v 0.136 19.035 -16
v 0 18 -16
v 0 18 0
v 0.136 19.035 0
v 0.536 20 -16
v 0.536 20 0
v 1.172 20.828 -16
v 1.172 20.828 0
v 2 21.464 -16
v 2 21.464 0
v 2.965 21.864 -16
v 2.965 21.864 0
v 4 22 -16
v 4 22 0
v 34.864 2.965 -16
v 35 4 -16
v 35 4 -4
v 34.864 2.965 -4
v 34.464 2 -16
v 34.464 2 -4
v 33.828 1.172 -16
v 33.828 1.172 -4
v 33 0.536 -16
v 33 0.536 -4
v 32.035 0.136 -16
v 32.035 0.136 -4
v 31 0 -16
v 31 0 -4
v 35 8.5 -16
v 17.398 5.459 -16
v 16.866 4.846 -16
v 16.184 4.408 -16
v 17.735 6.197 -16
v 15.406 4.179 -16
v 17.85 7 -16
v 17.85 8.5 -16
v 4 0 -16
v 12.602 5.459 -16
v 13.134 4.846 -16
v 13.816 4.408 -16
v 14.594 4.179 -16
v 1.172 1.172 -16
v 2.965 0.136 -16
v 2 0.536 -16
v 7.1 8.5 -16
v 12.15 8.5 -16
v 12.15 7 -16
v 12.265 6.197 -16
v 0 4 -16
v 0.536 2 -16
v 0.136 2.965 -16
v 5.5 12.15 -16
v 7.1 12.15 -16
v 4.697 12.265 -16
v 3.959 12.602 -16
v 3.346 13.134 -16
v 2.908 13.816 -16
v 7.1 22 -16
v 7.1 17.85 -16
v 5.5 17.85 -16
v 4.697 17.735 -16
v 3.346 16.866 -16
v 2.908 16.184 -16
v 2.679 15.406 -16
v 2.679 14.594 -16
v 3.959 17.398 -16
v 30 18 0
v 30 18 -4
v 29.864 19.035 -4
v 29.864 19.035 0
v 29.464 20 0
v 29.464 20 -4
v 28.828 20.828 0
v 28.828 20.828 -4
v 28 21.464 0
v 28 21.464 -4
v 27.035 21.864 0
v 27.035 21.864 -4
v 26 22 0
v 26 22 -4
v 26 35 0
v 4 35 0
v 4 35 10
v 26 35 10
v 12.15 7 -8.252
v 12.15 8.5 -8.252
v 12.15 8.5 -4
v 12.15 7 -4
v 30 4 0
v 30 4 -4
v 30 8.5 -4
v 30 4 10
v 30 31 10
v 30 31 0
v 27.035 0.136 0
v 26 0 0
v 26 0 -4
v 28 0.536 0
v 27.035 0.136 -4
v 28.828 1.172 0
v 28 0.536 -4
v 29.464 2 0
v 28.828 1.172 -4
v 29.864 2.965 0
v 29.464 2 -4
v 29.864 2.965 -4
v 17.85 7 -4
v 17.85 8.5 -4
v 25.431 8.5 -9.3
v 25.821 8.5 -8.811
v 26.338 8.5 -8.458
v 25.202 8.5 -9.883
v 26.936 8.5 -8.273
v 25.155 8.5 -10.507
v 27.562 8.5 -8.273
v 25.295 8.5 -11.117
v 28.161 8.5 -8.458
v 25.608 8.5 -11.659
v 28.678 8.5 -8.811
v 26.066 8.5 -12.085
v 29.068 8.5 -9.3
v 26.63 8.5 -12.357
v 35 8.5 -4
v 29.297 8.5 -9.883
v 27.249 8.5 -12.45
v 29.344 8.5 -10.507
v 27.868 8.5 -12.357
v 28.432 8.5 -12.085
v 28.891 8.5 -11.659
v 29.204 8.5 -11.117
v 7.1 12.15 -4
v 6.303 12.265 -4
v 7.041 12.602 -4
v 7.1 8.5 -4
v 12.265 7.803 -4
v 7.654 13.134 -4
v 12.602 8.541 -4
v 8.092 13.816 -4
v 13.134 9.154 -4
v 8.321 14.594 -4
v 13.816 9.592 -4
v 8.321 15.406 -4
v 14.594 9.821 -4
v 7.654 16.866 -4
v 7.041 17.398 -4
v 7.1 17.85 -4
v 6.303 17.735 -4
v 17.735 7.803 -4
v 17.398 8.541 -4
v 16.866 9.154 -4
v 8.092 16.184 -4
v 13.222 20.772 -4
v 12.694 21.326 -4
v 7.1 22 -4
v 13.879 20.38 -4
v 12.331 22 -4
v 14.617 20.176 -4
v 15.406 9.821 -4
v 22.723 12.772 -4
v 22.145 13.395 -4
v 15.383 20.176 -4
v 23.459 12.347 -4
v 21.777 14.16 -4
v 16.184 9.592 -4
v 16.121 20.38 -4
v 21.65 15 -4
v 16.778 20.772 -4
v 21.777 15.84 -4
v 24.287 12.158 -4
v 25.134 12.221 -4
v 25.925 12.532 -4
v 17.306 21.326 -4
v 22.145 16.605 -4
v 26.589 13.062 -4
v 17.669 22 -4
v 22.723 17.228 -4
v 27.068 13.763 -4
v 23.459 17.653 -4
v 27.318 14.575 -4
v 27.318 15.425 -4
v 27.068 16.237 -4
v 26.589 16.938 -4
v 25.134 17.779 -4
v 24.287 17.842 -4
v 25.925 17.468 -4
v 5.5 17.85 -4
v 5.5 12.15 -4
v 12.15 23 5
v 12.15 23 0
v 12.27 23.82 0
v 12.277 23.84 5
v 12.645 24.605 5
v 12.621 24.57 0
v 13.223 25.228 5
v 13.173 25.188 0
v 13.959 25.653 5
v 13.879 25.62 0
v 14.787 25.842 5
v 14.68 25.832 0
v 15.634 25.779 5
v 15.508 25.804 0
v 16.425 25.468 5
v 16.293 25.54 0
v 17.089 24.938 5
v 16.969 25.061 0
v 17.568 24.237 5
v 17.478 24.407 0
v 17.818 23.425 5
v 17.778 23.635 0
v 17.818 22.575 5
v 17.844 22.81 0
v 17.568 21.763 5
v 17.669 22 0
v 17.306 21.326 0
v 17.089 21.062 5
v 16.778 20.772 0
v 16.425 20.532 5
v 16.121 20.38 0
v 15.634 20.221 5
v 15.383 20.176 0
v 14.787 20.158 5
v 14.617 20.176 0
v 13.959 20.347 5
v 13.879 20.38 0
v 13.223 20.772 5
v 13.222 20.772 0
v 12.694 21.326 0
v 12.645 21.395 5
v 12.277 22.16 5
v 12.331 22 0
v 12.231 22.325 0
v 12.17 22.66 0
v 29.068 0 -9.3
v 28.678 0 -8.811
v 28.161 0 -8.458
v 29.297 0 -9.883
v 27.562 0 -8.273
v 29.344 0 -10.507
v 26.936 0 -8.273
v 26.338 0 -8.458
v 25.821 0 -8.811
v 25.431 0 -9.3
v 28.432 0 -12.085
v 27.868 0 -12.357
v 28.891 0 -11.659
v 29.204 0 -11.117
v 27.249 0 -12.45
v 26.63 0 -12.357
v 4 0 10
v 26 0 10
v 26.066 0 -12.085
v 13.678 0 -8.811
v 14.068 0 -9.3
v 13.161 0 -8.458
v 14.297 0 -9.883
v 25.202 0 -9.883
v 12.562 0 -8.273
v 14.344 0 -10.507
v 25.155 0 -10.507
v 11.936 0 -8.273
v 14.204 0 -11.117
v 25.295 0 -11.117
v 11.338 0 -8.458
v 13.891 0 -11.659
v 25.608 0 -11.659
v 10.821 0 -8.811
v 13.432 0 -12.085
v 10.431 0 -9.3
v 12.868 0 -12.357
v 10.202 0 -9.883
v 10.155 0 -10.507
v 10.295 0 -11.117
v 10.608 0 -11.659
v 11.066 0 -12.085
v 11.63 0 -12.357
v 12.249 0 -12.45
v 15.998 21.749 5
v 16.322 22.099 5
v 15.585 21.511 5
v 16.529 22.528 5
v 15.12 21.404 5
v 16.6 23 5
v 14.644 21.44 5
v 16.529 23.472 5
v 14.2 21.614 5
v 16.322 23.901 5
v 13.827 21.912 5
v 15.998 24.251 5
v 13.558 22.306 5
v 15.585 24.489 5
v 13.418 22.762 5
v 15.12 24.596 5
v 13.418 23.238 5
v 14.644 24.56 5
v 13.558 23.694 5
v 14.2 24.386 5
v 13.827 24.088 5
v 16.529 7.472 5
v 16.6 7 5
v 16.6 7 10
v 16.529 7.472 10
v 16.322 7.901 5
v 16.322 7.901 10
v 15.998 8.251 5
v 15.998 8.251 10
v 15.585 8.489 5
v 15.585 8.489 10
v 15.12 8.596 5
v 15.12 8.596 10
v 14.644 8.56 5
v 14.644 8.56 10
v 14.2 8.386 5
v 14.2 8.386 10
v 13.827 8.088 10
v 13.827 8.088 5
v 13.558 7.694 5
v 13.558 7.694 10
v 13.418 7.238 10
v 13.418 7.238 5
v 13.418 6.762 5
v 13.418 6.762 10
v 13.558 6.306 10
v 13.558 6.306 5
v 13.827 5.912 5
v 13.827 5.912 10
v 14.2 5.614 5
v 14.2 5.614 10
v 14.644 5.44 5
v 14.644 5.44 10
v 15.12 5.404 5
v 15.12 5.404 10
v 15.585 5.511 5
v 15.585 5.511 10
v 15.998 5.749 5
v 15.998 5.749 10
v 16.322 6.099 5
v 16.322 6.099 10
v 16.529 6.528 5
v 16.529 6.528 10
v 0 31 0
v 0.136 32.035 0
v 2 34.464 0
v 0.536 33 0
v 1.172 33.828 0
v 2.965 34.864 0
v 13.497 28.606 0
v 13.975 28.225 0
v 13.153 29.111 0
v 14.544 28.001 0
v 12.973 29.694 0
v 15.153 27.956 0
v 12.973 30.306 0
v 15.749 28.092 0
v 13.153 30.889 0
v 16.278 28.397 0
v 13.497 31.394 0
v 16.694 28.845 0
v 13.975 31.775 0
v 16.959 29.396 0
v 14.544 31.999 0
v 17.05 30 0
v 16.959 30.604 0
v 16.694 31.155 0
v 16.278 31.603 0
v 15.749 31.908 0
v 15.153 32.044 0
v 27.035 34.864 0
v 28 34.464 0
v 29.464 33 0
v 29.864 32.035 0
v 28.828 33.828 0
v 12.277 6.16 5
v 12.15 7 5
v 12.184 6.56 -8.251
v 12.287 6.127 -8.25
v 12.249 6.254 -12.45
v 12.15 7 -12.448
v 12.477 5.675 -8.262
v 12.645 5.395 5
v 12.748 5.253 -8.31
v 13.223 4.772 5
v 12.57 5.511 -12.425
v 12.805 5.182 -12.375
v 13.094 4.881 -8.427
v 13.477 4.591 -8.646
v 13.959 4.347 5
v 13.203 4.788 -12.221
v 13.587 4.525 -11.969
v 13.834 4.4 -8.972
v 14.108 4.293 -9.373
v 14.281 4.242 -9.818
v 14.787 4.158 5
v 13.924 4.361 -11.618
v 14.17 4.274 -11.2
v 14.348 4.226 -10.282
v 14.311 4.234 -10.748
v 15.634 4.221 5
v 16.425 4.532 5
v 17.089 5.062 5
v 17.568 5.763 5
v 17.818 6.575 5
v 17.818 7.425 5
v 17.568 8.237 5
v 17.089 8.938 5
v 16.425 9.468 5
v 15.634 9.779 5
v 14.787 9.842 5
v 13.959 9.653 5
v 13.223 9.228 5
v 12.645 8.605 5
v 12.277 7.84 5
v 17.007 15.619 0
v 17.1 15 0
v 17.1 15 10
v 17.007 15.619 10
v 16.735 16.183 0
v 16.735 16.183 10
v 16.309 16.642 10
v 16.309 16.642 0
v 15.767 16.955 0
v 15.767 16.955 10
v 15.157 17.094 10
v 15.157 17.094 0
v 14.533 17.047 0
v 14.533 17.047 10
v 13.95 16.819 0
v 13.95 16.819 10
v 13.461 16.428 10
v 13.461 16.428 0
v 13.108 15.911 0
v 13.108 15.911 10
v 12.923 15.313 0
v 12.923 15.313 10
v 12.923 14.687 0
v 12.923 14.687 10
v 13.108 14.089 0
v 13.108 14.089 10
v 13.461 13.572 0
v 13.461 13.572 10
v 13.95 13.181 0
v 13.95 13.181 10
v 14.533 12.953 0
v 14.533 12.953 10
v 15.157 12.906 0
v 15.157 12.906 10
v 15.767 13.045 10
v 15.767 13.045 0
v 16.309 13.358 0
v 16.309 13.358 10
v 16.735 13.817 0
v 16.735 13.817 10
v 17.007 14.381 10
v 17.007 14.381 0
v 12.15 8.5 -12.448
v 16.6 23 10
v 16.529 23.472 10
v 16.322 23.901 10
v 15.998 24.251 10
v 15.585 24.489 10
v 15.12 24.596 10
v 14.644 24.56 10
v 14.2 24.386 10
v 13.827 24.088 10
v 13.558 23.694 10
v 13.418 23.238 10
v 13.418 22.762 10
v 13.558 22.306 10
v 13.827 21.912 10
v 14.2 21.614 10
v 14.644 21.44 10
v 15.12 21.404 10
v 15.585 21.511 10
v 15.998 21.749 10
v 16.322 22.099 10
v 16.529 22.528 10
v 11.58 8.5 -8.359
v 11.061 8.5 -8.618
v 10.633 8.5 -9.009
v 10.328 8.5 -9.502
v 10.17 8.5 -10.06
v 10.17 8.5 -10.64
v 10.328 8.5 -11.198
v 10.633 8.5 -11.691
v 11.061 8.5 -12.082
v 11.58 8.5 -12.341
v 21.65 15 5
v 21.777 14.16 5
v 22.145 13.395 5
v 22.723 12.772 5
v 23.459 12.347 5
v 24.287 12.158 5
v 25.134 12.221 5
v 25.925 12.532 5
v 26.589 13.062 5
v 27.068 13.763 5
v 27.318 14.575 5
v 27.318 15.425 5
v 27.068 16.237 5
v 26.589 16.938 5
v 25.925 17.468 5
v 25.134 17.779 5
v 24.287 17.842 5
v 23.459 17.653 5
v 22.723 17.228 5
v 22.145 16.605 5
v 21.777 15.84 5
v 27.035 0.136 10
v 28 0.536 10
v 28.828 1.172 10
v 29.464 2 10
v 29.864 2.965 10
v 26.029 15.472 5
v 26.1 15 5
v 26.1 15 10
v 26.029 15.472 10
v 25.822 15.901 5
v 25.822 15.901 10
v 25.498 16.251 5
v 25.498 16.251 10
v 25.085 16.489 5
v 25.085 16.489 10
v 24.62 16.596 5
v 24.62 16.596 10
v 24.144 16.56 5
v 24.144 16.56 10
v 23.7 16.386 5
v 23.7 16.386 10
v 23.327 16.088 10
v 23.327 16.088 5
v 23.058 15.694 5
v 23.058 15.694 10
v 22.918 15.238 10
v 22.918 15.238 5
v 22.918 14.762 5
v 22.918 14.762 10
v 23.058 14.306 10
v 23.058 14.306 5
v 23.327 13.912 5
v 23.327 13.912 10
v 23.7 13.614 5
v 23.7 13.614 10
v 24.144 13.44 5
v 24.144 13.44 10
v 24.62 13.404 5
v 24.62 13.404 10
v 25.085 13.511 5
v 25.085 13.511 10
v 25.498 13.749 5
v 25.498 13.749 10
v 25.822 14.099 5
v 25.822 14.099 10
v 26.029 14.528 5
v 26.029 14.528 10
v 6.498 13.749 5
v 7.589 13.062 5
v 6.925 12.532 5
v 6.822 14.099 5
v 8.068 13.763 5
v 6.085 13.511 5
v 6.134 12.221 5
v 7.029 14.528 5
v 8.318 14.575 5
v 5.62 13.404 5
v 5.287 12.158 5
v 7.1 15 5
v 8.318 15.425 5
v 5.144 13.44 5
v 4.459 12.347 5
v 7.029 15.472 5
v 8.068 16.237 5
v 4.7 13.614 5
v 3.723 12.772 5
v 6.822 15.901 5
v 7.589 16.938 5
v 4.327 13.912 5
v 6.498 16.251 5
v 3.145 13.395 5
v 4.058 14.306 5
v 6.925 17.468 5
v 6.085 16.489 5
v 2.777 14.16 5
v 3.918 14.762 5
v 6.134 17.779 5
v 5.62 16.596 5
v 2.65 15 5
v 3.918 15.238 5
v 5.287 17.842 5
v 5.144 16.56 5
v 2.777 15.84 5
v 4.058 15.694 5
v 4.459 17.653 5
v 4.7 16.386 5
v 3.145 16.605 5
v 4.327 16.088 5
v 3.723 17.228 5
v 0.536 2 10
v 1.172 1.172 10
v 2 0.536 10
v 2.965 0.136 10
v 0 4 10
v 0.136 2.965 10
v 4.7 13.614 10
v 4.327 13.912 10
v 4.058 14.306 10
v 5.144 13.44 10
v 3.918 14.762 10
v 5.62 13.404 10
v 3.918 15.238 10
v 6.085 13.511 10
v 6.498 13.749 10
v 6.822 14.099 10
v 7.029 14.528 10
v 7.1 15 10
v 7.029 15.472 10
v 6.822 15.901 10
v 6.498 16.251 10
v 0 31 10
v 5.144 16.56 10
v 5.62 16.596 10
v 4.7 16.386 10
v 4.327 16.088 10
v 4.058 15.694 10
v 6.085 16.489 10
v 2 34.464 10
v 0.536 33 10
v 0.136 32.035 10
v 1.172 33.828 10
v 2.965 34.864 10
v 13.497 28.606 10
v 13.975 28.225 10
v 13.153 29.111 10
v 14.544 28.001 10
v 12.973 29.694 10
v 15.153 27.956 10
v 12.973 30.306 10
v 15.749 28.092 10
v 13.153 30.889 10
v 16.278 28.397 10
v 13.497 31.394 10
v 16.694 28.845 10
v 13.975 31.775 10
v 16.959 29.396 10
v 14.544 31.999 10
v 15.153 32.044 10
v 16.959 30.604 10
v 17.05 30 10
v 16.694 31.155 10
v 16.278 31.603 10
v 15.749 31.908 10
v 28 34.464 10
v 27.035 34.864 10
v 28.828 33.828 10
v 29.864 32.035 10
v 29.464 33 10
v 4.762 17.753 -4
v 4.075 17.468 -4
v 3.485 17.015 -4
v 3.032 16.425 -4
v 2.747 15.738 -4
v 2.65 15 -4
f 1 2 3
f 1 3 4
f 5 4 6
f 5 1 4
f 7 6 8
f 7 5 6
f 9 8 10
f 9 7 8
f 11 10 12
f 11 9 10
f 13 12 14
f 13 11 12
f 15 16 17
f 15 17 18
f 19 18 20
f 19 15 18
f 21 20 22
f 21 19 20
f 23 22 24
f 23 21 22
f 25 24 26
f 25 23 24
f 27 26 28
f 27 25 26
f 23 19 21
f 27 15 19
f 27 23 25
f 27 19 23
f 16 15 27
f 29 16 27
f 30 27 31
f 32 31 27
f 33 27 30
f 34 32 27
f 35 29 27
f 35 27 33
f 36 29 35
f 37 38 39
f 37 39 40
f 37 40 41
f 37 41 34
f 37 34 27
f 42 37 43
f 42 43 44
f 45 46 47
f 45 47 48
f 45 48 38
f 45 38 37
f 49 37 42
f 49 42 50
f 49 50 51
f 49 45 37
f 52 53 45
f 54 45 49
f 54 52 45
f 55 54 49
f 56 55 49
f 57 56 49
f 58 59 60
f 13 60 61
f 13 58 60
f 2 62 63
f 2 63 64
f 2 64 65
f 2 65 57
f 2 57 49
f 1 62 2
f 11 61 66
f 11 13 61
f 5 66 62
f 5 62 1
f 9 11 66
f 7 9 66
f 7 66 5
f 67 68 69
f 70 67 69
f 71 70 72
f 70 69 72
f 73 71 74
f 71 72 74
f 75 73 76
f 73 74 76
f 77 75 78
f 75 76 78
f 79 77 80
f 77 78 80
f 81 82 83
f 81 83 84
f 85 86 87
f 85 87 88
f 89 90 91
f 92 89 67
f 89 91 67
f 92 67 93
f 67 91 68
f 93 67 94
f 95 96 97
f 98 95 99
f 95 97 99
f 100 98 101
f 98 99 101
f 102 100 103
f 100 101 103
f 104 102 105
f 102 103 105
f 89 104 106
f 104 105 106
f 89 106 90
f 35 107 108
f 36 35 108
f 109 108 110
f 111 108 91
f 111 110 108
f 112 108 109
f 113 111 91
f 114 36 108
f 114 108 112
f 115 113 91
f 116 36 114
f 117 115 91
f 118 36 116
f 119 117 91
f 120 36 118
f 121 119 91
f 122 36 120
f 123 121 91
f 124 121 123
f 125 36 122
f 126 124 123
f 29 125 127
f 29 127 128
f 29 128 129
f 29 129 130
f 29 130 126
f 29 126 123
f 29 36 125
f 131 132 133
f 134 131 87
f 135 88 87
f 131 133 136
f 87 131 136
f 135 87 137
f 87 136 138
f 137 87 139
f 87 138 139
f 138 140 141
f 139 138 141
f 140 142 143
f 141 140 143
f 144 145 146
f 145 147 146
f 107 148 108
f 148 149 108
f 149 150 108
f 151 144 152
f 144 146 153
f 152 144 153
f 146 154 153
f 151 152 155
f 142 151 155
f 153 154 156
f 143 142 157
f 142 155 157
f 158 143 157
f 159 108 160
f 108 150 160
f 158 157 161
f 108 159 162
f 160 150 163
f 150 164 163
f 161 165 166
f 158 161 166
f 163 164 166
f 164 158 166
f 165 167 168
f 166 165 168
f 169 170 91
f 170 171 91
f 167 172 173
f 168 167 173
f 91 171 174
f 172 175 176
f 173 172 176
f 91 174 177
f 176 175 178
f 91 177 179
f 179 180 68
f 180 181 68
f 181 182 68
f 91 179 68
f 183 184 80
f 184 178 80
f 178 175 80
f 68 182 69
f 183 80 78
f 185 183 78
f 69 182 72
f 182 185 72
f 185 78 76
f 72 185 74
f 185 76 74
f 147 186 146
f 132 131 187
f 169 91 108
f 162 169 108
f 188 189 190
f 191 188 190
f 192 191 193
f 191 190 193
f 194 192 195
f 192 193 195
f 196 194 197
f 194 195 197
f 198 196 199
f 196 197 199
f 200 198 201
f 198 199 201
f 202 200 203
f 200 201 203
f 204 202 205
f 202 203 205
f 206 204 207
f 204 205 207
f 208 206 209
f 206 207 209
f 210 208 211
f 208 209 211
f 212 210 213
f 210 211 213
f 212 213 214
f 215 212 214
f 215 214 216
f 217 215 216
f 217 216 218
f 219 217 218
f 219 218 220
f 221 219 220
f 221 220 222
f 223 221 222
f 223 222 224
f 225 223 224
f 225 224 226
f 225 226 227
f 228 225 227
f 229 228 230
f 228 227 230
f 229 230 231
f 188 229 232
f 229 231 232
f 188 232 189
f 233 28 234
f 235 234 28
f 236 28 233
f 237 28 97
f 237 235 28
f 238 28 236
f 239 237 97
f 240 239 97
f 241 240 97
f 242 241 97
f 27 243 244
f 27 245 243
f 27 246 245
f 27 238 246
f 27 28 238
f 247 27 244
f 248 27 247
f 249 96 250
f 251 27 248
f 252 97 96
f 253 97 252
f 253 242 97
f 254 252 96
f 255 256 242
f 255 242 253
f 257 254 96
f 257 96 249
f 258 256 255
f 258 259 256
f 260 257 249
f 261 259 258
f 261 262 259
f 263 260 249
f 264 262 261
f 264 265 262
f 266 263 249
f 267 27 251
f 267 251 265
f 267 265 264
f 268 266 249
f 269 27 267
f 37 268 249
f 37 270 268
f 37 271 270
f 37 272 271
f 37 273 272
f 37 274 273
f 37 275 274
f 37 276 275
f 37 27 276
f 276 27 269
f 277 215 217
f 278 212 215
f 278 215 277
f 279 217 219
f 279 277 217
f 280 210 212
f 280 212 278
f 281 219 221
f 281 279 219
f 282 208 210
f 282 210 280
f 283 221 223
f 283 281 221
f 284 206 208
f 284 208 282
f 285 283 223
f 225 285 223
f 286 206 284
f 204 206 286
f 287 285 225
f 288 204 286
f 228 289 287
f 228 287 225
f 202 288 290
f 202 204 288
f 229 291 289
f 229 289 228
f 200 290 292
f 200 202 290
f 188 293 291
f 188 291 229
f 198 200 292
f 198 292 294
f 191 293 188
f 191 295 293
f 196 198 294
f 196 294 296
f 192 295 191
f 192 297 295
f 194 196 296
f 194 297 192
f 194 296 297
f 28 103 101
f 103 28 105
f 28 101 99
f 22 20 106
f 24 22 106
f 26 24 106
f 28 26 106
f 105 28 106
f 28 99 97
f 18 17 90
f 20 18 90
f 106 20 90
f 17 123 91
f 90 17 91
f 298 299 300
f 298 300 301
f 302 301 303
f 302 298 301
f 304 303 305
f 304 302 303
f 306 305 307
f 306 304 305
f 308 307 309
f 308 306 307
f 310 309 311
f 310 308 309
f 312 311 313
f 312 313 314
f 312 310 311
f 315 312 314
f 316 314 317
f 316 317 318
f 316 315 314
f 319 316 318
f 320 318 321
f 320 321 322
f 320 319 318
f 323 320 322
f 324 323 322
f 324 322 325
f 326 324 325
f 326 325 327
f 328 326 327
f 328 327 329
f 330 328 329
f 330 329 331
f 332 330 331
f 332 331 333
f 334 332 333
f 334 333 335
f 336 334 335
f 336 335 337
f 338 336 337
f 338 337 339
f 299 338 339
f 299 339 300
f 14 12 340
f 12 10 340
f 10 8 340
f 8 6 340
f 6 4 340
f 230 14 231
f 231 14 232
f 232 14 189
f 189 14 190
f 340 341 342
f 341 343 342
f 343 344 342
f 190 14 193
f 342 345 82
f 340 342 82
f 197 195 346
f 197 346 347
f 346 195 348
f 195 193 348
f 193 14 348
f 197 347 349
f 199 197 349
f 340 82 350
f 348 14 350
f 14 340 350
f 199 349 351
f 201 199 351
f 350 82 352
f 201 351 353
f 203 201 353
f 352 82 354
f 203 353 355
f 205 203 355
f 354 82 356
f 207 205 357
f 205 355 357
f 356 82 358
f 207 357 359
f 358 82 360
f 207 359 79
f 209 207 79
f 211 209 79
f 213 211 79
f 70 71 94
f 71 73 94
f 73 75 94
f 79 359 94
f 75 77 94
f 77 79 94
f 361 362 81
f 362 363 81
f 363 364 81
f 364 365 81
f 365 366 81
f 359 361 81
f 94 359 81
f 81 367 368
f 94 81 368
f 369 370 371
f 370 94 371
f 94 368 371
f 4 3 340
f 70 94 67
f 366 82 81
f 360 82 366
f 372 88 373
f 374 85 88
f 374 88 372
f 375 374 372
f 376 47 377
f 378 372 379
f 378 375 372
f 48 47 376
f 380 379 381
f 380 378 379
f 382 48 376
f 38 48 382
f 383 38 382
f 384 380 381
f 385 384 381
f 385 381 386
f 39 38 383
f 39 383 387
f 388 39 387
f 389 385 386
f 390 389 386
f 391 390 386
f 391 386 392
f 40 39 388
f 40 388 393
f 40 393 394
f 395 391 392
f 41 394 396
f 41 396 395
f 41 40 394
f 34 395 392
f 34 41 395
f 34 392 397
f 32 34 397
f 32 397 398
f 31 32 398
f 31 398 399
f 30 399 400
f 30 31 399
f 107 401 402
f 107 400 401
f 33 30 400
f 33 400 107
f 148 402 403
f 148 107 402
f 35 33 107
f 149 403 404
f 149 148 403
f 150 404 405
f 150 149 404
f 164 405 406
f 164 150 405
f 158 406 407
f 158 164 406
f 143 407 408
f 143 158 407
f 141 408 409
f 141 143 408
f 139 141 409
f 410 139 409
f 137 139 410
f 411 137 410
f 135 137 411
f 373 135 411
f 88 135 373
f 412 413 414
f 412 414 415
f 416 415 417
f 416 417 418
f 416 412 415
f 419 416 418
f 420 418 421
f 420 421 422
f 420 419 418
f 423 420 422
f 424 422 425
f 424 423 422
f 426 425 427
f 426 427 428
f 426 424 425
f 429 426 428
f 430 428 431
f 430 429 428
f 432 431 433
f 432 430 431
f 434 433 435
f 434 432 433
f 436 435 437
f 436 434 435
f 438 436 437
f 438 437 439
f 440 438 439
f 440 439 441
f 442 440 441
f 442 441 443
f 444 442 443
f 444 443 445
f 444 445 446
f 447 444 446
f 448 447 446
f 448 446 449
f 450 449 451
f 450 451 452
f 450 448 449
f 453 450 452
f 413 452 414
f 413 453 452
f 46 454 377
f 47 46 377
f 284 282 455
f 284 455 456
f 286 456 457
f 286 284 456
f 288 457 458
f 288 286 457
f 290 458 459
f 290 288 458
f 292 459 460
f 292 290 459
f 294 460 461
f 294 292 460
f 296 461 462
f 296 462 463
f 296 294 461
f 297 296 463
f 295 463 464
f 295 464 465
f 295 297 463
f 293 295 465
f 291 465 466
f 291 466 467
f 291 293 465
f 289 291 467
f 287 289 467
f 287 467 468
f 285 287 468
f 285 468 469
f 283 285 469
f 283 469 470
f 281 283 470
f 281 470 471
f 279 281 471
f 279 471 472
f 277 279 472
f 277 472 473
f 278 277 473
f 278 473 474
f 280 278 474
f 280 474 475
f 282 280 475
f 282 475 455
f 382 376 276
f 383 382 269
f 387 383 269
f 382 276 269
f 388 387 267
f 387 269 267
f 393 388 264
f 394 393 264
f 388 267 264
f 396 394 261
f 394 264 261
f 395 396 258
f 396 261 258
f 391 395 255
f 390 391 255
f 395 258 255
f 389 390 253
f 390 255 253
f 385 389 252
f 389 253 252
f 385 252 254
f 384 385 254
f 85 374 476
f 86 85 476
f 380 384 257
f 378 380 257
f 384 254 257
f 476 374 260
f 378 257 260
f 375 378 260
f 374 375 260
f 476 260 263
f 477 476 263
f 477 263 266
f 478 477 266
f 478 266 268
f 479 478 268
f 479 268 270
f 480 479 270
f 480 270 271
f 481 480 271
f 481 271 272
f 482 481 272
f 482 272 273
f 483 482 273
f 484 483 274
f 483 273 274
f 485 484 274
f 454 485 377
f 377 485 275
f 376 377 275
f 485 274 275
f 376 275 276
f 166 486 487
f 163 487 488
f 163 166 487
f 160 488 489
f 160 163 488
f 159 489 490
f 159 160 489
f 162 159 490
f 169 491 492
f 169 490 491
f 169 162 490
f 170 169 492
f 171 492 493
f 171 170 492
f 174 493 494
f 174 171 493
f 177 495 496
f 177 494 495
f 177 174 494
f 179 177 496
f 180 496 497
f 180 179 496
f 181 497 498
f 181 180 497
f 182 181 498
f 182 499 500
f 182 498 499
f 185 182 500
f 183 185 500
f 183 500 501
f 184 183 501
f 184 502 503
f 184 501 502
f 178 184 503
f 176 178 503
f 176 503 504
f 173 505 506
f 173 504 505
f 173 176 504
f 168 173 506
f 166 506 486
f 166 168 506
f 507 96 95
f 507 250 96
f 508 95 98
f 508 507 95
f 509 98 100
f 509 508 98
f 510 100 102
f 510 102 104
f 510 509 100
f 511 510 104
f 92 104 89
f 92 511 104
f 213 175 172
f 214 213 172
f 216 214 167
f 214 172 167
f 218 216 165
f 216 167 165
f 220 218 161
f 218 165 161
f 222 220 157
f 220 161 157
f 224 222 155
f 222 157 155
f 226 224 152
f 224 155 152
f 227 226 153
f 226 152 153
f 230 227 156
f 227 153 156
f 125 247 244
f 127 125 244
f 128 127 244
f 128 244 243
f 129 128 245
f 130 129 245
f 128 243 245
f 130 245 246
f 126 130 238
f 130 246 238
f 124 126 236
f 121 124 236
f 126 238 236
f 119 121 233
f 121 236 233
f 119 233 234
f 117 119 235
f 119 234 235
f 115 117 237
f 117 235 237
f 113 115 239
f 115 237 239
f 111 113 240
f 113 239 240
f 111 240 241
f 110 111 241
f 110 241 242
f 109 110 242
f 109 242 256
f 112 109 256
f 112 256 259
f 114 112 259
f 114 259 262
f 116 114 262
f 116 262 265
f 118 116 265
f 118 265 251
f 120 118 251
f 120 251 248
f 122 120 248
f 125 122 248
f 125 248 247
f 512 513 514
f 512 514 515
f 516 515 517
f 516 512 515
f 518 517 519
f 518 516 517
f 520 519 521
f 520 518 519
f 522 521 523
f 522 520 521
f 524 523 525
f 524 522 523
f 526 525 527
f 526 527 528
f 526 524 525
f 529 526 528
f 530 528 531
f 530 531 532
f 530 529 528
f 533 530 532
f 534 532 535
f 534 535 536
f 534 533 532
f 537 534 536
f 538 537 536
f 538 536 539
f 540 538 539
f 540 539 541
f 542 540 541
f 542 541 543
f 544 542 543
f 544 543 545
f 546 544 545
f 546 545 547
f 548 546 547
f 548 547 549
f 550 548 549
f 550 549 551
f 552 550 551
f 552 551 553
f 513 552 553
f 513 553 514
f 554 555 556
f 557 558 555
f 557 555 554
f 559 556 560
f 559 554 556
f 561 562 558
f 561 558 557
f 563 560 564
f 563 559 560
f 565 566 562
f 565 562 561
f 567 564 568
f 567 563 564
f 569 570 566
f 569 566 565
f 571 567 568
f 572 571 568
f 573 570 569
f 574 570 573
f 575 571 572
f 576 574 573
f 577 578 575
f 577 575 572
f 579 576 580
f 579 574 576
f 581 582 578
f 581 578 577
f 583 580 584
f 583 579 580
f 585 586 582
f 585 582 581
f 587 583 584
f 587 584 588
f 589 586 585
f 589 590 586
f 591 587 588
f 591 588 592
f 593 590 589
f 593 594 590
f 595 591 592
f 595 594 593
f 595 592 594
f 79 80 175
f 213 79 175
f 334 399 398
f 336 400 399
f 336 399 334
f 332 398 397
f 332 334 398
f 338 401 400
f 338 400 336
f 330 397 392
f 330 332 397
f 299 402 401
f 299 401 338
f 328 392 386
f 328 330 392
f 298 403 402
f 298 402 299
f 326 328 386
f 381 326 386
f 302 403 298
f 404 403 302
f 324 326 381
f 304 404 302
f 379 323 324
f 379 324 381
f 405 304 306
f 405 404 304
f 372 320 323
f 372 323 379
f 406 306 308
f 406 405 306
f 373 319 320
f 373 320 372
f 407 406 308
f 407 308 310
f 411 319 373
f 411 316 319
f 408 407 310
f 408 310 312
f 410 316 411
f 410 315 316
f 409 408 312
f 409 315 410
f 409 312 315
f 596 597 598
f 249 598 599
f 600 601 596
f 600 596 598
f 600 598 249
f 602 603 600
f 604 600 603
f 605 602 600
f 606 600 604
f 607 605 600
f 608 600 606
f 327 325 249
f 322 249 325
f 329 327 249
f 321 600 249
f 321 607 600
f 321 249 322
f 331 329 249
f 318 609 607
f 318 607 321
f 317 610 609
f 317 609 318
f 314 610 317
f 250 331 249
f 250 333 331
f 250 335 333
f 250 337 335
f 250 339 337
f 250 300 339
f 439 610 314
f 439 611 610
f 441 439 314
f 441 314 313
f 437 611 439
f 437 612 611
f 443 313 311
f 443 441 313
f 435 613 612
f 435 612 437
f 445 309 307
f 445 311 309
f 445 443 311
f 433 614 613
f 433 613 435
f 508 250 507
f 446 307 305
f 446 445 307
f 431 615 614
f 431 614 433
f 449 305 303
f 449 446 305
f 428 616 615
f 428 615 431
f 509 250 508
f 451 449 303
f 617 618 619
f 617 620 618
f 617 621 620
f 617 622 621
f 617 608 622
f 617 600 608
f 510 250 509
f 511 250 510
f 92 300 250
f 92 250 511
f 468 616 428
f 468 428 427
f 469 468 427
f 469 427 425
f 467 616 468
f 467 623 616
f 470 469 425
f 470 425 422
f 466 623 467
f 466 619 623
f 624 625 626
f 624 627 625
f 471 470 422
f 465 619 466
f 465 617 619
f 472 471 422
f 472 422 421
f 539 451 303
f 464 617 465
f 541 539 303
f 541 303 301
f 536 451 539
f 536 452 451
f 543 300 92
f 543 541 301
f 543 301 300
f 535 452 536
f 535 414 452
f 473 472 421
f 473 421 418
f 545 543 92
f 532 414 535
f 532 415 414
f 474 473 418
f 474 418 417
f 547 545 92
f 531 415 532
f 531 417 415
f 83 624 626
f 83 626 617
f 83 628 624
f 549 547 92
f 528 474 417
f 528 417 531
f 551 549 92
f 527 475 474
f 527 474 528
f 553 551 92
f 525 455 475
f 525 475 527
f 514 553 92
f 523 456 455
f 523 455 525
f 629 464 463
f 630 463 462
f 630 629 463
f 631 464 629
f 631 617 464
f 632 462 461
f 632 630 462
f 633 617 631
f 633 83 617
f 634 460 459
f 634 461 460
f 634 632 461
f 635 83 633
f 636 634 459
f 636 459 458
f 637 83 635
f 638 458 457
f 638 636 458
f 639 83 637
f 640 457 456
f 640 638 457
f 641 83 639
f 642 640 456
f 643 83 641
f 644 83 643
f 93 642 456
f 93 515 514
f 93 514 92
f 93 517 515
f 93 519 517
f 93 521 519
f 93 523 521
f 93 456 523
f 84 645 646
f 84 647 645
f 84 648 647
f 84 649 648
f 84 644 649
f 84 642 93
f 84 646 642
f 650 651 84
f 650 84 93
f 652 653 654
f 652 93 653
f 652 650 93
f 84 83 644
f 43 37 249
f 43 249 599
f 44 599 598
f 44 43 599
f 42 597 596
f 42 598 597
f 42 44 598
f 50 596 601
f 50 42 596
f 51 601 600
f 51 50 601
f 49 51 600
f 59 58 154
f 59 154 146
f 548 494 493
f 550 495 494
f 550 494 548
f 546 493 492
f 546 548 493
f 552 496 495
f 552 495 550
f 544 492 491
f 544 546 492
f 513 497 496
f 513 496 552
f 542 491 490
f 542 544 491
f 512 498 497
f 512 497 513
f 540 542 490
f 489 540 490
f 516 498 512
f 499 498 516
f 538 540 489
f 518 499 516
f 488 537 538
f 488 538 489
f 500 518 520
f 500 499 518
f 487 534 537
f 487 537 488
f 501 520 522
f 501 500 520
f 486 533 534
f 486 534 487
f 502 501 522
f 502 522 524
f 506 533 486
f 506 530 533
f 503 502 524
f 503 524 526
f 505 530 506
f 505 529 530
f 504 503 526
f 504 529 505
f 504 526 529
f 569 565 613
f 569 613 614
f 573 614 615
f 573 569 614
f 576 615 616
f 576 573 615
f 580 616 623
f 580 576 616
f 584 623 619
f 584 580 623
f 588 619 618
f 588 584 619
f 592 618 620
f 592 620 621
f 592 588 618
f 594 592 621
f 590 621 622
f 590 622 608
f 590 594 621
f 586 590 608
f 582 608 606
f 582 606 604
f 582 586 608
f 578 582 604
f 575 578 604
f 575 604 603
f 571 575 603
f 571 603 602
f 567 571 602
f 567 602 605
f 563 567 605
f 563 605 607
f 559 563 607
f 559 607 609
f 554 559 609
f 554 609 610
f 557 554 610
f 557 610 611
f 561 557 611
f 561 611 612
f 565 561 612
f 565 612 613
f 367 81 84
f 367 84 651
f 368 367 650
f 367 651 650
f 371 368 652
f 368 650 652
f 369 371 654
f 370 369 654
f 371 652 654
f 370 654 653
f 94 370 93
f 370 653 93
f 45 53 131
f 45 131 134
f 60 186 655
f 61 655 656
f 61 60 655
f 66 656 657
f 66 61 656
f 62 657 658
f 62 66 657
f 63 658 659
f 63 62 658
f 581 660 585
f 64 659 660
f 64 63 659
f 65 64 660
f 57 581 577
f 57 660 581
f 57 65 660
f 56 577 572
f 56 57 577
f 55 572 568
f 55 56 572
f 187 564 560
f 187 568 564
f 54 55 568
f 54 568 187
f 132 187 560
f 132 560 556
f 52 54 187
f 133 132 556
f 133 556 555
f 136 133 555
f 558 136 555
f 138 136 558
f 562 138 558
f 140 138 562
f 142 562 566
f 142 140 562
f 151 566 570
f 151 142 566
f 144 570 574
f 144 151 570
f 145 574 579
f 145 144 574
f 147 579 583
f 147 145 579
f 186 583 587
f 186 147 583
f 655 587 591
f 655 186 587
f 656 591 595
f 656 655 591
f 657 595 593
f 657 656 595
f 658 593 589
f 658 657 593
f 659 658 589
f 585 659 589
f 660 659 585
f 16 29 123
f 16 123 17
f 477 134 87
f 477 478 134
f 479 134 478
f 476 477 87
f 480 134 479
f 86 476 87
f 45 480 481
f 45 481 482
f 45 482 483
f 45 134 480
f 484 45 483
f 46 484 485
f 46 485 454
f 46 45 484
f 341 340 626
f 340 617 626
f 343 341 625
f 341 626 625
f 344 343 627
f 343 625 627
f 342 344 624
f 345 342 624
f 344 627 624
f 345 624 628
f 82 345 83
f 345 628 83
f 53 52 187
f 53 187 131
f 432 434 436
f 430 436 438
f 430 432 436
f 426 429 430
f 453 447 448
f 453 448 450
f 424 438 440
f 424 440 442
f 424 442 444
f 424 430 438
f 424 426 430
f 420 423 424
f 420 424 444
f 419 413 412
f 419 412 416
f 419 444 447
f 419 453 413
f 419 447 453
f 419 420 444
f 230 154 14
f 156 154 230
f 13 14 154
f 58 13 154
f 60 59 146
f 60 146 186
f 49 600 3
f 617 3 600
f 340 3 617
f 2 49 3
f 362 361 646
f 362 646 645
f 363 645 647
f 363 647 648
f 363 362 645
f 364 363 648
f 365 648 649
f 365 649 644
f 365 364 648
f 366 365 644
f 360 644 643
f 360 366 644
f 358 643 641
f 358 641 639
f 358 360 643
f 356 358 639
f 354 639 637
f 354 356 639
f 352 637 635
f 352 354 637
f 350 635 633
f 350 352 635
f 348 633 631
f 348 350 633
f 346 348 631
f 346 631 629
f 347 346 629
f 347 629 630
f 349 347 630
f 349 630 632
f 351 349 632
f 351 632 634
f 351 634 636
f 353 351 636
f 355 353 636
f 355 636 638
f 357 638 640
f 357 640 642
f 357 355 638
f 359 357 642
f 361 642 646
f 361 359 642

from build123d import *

# Parameters (mm, degrees)
SKETCH1_W           = 30
SKETCH1_H           = 35
SKETCH1_R           = 2.05
SKETCH1_R_2         = 2.1
SKETCH1_R_3         = 1.6
BOSS_EXTRUDE1_DEPTH = 10
SKETCH2_R           = 2.85
CUT_EXTRUDE1_DEPTH  = 5
FILLET1_R           = 4
BOSS_EXTRUDE2_START = -4
SKETCH6_R           = 2.85
BOSS_EXTRUDE2_DEPTH = 4
BOSS_EXTRUDE3_START = 12
BOSS_EXTRUDE3_DEPTH = 12
SKETCH8_R           = 2.1
CUT_EXTRUDE4_DEPTH  = 53.019227215


with BuildPart() as part:
    # Sketch1 → Boss-Extrude1 (new body)
    with BuildSketch(Plane.XY):
        with Locations((15, 17.5)):
            Rectangle(SKETCH1_W, SKETCH1_H)
        with Locations((15, 30)):
            Circle(SKETCH1_R, mode=Mode.SUBTRACT)
        with Locations((15, 15)):
            Circle(SKETCH1_R_2, mode=Mode.SUBTRACT)
        with Locations((5.5, 15)):
            Circle(SKETCH1_R_3, mode=Mode.SUBTRACT)
        with Locations((24.5, 15)):
            Circle(SKETCH1_R_3, mode=Mode.SUBTRACT)
        with Locations((15, 7)):
            Circle(SKETCH1_R_3, mode=Mode.SUBTRACT)
        with Locations((15, 23)):
            Circle(SKETCH1_R_3, mode=Mode.SUBTRACT)
    extrude(amount=BOSS_EXTRUDE1_DEPTH)

    # Sketch2 → Cut-Extrude1 (cut)
    with BuildSketch(Plane(origin=(0, 0, 0), x_dir=(-1, 0, 0), z_dir=(0, 0, -1))):
        with Locations((-15, 7)):
            Circle(SKETCH2_R)
        with Locations((-24.5, 15)):
            Circle(SKETCH2_R)
        with Locations((-15, 23)):
            Circle(SKETCH2_R)
        with Locations((-5.5, 15)):
            Circle(SKETCH2_R)
    extrude(amount=-CUT_EXTRUDE1_DEPTH, mode=Mode.SUBTRACT)

    # Fillet1
    fillet1_edges = [part.edges().sort_by_distance(p)[0] for p in [
        (0, 35, 5),
        (30, 35, 5),
        (30, 0, 5),
        (0, 0, 5),
    ]]
    fillet(fillet1_edges, radius=FILLET1_R)

    # Sketch6 → Boss-Extrude2 (add)
    with BuildSketch(Plane.XY.offset(BOSS_EXTRUDE2_START)):
        with BuildLine():
            Line((26, 22), (17.668801229, 22))
            ThreePointArc((17.668801229, 22), (15, 20.15), (12.331198771, 22))
            Line((12.331198771, 22), (4, 22))
            ThreePointArc((4, 22), (1.171572875, 20.828427125), (0, 18))
            Line((0, 18), (0, 4))
            ThreePointArc((0, 4), (1.171572875, 1.171572875), (4, 0))
            Line((4, 0), (26, 0))
            ThreePointArc((26, 0), (28.828427125, 1.171572875), (30, 4))
            Line((30, 4), (30, 18))
            ThreePointArc((30, 18), (28.828427125, 20.828427125), (26, 22))
        make_face()
        with Locations((5.5, 15)):
            Circle(SKETCH6_R, mode=Mode.SUBTRACT)
        with Locations((15, 7)):
            Circle(SKETCH6_R, mode=Mode.SUBTRACT)
        with Locations((24.5, 15)):
            Circle(SKETCH6_R, mode=Mode.SUBTRACT)
    extrude(amount=BOSS_EXTRUDE2_DEPTH)

    # Sketch7 → Boss-Extrude3 (add)
    with BuildSketch(Plane(origin=(0, 0, -4), x_dir=(-1, 0, 0), z_dir=(0, 0, -1)).offset(BOSS_EXTRUDE3_START)):
        with BuildLine():
            Line((-7.1, 22), (-7.1, 17.85))
            Line((-7.1, 17.85), (-5.5, 17.85))
            ThreePointArc((-5.5, 17.85), (-2.65, 15), (-5.5, 12.15))
            Line((-5.5, 12.15), (-7.1, 12.15))
            Line((-7.1, 12.15), (-7.1, 8.5))
            Line((-7.1, 8.5), (-12.15, 8.5))
            Line((-12.15, 8.5), (-12.15, 7))
            ThreePointArc((-12.15, 7), (-15, 4.15), (-17.85, 7))
            Line((-17.85, 7), (-17.85, 8.5))
            Line((-17.85, 8.5), (-30, 8.5))
            Line((-30, 8.5), (-35, 8.5))
            Line((-35, 8.5), (-35, 4))
            ThreePointArc((-35, 4), (-33.828427125, 1.171572875), (-31, 0))
            Line((-31, 0), (-26, 0))
            Line((-26, 0), (-4, 0))
            ThreePointArc((-4, 0), (-1.171572875, 1.171572875), (0, 4))
            Line((0, 4), (0, 18))
            ThreePointArc((0, 18), (-1.171572875, 20.828427125), (-4, 22))
            Line((-4, 22), (-7.1, 22))
        make_face()
    extrude(amount=-BOSS_EXTRUDE3_DEPTH)

    # Sketch8 → Cut-Extrude4 (cut, through all)
    with BuildSketch(Plane.XZ):
        with Locations((12.249401243, -10.35)):
            Circle(SKETCH8_R)
        with Locations((27.249401243, -10.35)):
            Circle(SKETCH8_R)
    extrude(amount=-CUT_EXTRUDE4_DEPTH, mode=Mode.SUBTRACT)


solid = part.part
